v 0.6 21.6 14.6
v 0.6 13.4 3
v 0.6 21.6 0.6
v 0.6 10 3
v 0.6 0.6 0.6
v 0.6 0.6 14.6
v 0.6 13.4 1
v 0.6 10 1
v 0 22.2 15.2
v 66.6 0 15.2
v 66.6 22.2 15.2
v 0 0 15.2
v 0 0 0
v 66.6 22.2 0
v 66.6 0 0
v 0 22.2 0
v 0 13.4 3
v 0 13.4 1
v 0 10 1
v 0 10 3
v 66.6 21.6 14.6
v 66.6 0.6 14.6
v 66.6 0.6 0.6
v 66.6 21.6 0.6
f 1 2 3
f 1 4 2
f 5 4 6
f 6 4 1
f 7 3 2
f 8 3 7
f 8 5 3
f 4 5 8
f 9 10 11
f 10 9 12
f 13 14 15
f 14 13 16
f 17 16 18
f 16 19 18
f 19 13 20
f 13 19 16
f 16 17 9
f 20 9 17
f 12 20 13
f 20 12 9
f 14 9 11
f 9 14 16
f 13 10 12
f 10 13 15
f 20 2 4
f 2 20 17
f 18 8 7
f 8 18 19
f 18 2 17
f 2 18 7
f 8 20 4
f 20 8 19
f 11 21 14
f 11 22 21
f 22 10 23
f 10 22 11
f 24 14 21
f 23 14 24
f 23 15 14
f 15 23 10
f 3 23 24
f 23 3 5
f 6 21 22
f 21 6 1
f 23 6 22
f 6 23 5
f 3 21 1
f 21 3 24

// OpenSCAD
thickness = 0.6;
width = 21;
height = 14;
length = 66;

difference() {
    cube([thickness, width + 2 * thickness, height + 2 * thickness]); // back
    
    translate([-5, 10, 1]) cube([10, 3.4, 2.0]);
}

translate([thickness, 0, 0]) cube([length, width + 2 * thickness, thickness]); // bottom
translate([thickness, 0, height + thickness]) cube([length, width + 2 * thickness, thickness]); // top

translate([thickness, 0, thickness]) cube([length, thickness, height]); // left
translate([thickness, width + thickness, thickness]) cube([length, thickness, height]); // right
